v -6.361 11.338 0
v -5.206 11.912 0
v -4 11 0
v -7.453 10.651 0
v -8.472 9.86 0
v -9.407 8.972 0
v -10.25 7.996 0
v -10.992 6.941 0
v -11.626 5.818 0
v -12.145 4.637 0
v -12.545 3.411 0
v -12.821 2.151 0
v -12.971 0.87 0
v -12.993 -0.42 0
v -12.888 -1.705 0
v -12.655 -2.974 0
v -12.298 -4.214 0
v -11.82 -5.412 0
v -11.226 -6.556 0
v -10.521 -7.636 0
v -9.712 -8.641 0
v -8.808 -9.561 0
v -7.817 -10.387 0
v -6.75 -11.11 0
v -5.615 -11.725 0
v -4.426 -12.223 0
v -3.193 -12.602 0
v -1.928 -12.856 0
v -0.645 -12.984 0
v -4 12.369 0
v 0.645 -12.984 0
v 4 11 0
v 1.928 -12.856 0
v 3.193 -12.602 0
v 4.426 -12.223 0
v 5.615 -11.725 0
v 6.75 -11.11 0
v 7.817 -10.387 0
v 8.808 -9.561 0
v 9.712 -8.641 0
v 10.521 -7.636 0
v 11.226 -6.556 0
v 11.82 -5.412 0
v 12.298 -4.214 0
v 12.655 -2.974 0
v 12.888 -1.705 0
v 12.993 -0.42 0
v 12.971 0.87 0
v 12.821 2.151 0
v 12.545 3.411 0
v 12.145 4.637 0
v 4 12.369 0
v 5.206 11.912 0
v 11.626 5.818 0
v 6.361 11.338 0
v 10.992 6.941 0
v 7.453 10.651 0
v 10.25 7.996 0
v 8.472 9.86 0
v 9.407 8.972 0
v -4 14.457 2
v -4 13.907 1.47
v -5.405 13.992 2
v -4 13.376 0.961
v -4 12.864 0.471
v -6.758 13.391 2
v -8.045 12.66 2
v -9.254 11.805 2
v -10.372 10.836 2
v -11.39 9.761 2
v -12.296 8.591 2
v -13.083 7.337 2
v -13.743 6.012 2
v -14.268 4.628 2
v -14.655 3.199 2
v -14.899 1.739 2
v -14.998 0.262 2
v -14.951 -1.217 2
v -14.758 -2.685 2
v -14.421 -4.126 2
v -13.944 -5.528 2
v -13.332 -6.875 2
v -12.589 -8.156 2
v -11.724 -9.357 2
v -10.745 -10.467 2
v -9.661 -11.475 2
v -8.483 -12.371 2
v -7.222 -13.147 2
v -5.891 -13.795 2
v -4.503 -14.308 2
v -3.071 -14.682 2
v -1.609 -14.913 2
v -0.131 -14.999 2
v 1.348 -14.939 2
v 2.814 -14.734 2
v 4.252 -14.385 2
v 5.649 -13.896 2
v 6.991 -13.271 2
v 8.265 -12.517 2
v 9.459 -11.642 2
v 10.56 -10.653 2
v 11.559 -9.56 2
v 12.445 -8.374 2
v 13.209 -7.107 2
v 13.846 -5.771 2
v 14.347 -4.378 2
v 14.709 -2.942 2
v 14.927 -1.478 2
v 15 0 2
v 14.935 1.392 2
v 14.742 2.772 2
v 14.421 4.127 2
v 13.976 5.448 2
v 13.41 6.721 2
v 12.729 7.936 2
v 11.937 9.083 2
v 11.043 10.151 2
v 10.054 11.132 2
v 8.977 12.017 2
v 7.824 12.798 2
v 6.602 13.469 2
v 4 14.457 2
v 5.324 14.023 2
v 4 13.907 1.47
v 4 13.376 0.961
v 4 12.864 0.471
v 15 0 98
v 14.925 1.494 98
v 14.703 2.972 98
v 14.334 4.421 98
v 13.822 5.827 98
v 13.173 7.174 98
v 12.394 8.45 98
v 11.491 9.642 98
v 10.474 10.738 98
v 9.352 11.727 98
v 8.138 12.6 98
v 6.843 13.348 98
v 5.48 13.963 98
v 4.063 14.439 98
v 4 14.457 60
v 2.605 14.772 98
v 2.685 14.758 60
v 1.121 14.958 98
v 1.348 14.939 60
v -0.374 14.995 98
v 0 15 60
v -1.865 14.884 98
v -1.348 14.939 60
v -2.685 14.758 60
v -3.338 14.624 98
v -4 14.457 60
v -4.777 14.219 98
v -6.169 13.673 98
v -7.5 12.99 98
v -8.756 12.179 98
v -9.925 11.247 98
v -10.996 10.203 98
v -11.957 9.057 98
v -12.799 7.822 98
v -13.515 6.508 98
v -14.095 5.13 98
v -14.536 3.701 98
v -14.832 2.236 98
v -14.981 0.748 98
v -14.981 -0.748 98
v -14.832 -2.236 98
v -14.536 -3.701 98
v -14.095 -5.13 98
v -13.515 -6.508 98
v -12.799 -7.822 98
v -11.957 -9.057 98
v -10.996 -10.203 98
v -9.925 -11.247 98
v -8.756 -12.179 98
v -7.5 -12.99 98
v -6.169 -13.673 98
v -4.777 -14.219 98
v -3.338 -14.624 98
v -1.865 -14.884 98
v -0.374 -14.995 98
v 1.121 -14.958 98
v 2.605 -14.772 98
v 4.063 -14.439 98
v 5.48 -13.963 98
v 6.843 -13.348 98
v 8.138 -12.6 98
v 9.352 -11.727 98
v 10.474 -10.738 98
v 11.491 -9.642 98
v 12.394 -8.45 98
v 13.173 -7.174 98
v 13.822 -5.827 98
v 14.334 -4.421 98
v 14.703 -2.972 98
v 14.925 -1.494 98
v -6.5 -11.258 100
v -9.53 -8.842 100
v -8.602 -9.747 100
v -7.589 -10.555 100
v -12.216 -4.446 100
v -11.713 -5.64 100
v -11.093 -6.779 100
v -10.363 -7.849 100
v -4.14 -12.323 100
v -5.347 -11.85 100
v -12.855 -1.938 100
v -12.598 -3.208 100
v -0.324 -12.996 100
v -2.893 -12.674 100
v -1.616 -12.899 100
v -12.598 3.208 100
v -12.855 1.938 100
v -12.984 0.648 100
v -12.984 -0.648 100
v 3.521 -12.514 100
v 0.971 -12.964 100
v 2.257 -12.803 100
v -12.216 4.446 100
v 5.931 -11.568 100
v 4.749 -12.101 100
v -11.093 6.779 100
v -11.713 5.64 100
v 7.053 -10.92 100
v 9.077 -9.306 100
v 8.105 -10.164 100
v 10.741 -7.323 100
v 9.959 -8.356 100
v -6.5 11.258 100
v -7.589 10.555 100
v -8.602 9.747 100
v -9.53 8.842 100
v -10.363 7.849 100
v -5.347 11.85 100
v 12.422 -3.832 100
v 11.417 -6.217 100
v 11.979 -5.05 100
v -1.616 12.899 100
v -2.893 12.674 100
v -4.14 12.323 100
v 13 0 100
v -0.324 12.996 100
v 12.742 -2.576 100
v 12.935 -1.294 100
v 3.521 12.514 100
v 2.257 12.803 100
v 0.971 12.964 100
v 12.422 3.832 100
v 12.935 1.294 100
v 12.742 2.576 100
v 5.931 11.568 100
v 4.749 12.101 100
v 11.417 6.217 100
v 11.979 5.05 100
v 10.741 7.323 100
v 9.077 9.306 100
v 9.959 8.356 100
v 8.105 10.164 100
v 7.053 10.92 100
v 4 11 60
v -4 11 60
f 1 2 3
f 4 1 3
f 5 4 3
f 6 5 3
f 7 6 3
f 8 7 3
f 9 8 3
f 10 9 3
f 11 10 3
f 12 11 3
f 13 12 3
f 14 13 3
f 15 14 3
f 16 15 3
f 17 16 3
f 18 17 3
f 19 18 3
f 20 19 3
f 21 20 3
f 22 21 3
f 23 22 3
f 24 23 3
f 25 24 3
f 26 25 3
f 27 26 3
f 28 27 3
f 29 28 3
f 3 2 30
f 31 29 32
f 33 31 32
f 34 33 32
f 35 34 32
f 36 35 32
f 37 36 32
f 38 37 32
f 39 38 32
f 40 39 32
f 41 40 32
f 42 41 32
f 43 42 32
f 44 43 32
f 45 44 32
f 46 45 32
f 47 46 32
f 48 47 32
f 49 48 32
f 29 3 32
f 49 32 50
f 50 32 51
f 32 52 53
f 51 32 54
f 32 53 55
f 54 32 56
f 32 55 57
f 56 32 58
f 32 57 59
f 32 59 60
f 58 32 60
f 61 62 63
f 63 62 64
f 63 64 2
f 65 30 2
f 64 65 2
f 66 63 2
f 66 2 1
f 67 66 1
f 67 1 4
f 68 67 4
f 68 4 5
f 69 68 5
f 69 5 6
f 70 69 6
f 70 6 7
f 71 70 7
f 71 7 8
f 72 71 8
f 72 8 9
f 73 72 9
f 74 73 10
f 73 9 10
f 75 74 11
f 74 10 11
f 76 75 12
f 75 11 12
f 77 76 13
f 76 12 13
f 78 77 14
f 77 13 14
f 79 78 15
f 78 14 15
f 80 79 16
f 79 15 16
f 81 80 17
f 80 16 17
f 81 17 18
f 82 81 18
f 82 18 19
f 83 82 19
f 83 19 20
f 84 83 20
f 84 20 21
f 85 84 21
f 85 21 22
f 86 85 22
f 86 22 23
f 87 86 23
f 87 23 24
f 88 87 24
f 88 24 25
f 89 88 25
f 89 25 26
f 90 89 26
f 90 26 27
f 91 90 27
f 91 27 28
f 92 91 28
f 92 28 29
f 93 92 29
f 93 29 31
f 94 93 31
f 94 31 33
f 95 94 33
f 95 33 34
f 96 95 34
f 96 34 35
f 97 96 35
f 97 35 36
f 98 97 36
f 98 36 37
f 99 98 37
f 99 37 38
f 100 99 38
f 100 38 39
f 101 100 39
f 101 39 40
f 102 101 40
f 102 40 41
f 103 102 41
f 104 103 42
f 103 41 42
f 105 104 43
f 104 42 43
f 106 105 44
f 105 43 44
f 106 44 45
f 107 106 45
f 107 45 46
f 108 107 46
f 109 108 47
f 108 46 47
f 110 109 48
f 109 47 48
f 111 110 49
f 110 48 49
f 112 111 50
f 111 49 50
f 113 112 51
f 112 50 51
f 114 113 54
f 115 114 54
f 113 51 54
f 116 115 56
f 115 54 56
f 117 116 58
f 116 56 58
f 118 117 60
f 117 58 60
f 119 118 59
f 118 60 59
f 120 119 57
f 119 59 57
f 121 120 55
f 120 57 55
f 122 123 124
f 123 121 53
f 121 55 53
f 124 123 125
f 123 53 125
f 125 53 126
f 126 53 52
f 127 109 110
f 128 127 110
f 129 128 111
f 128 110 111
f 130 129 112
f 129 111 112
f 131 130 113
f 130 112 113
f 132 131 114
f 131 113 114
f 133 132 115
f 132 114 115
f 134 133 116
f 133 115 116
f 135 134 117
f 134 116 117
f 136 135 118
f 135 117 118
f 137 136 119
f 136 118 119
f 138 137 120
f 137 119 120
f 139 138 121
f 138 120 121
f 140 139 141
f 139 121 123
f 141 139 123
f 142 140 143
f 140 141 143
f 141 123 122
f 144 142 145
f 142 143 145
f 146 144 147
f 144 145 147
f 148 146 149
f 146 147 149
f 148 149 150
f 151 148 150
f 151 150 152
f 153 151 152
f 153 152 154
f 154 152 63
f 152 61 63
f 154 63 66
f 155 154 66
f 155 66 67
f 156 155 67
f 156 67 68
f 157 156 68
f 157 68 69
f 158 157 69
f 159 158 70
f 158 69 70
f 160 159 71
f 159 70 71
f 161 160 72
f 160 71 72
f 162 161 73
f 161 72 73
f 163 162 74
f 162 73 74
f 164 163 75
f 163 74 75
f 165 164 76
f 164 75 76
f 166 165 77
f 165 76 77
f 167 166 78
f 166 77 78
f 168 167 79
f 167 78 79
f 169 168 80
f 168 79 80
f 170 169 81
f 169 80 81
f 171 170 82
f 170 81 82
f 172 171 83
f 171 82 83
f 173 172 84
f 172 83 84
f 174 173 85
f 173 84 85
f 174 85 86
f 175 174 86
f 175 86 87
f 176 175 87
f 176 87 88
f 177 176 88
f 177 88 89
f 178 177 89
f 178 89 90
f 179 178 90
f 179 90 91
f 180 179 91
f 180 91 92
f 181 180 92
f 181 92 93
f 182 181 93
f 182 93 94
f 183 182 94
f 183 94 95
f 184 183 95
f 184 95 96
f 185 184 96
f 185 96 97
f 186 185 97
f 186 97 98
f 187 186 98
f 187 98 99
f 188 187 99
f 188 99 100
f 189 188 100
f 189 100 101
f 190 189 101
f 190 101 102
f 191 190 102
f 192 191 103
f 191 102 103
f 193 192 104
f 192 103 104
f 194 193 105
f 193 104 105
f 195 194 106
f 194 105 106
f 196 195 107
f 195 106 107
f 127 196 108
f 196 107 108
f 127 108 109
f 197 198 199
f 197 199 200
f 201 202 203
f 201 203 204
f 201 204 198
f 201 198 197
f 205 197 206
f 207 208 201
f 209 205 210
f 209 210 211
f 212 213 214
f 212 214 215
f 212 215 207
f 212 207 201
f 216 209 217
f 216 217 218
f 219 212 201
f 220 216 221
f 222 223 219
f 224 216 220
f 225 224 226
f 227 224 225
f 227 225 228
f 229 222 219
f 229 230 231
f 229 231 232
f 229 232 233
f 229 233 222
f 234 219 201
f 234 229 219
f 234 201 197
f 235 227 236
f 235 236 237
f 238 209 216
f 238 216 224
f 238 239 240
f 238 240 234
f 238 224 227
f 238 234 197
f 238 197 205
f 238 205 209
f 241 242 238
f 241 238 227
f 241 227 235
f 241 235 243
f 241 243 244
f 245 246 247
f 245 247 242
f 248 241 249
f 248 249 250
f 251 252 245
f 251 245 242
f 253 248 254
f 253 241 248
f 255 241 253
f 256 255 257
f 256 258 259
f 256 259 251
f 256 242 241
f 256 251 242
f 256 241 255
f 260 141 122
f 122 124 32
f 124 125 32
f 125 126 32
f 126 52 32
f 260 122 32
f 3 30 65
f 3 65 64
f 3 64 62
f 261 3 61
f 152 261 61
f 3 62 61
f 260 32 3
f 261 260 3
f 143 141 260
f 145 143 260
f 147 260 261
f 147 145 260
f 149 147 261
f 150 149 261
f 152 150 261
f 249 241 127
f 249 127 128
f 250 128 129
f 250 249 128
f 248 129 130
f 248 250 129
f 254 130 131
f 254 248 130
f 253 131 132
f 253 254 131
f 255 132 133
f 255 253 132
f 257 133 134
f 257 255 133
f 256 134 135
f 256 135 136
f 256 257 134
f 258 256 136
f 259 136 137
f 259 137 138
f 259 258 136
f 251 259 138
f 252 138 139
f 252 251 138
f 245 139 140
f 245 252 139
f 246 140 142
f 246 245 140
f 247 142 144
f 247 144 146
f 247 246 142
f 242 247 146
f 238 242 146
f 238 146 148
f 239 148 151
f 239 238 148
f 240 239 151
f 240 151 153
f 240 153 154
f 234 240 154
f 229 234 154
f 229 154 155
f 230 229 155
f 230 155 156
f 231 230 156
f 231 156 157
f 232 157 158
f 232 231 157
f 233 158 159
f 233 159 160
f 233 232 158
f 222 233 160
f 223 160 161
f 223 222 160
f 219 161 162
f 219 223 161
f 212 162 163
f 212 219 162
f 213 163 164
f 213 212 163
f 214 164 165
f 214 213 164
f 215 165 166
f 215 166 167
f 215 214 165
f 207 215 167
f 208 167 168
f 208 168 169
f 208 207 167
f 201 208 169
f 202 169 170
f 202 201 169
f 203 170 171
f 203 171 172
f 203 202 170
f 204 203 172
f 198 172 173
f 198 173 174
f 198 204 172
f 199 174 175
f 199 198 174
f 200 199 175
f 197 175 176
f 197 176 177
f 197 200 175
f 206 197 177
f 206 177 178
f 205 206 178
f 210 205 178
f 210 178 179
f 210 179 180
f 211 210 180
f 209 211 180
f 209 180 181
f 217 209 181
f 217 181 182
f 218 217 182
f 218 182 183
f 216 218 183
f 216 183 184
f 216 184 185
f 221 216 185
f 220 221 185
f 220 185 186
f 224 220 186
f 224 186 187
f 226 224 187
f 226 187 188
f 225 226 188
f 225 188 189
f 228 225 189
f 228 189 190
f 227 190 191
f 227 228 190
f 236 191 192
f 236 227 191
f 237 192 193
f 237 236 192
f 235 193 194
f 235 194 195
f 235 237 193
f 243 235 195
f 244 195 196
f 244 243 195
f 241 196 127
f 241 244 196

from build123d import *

# Parameters (mm, degrees)
SKETCH1_R           = 15
BOSS_EXTRUDE1_DEPTH = 100
CHAMFER1_SIZE       = 2
CHAMFER2_SIZE       = 2
CUT_EXTRUDE1_DEPTH  = 60


with BuildPart() as part:
    # Sketch1 → Boss-Extrude1 (new body)
    with BuildSketch(Plane.XY):
        Circle(SKETCH1_R)
    extrude(amount=BOSS_EXTRUDE1_DEPTH)

    # Chamfer1
    chamfer1_edges = [part.edges().sort_by_distance(p)[0] for p in [
        (-15, 0, 100),
    ]]
    chamfer(chamfer1_edges, length=CHAMFER1_SIZE)

    # Chamfer2
    chamfer2_edges = [part.edges().sort_by_distance(p)[0] for p in [
        (-15, 0, 0),
    ]]
    chamfer(chamfer2_edges, length=CHAMFER2_SIZE)

    # Sketch2 → Cut-Extrude1 (cut)
    with BuildSketch(Plane(origin=(0, 0, 0), x_dir=(-1, 0, 0), z_dir=(0, 0, -1))):
        Polygon((-4, 11), (4, 11), (4, 14.456832295), (4, 16.003421776), (-4, 16.003421776), (-4, 14.456832295), align=None)
    extrude(amount=-CUT_EXTRUDE1_DEPTH, mode=Mode.SUBTRACT)


solid = part.part
